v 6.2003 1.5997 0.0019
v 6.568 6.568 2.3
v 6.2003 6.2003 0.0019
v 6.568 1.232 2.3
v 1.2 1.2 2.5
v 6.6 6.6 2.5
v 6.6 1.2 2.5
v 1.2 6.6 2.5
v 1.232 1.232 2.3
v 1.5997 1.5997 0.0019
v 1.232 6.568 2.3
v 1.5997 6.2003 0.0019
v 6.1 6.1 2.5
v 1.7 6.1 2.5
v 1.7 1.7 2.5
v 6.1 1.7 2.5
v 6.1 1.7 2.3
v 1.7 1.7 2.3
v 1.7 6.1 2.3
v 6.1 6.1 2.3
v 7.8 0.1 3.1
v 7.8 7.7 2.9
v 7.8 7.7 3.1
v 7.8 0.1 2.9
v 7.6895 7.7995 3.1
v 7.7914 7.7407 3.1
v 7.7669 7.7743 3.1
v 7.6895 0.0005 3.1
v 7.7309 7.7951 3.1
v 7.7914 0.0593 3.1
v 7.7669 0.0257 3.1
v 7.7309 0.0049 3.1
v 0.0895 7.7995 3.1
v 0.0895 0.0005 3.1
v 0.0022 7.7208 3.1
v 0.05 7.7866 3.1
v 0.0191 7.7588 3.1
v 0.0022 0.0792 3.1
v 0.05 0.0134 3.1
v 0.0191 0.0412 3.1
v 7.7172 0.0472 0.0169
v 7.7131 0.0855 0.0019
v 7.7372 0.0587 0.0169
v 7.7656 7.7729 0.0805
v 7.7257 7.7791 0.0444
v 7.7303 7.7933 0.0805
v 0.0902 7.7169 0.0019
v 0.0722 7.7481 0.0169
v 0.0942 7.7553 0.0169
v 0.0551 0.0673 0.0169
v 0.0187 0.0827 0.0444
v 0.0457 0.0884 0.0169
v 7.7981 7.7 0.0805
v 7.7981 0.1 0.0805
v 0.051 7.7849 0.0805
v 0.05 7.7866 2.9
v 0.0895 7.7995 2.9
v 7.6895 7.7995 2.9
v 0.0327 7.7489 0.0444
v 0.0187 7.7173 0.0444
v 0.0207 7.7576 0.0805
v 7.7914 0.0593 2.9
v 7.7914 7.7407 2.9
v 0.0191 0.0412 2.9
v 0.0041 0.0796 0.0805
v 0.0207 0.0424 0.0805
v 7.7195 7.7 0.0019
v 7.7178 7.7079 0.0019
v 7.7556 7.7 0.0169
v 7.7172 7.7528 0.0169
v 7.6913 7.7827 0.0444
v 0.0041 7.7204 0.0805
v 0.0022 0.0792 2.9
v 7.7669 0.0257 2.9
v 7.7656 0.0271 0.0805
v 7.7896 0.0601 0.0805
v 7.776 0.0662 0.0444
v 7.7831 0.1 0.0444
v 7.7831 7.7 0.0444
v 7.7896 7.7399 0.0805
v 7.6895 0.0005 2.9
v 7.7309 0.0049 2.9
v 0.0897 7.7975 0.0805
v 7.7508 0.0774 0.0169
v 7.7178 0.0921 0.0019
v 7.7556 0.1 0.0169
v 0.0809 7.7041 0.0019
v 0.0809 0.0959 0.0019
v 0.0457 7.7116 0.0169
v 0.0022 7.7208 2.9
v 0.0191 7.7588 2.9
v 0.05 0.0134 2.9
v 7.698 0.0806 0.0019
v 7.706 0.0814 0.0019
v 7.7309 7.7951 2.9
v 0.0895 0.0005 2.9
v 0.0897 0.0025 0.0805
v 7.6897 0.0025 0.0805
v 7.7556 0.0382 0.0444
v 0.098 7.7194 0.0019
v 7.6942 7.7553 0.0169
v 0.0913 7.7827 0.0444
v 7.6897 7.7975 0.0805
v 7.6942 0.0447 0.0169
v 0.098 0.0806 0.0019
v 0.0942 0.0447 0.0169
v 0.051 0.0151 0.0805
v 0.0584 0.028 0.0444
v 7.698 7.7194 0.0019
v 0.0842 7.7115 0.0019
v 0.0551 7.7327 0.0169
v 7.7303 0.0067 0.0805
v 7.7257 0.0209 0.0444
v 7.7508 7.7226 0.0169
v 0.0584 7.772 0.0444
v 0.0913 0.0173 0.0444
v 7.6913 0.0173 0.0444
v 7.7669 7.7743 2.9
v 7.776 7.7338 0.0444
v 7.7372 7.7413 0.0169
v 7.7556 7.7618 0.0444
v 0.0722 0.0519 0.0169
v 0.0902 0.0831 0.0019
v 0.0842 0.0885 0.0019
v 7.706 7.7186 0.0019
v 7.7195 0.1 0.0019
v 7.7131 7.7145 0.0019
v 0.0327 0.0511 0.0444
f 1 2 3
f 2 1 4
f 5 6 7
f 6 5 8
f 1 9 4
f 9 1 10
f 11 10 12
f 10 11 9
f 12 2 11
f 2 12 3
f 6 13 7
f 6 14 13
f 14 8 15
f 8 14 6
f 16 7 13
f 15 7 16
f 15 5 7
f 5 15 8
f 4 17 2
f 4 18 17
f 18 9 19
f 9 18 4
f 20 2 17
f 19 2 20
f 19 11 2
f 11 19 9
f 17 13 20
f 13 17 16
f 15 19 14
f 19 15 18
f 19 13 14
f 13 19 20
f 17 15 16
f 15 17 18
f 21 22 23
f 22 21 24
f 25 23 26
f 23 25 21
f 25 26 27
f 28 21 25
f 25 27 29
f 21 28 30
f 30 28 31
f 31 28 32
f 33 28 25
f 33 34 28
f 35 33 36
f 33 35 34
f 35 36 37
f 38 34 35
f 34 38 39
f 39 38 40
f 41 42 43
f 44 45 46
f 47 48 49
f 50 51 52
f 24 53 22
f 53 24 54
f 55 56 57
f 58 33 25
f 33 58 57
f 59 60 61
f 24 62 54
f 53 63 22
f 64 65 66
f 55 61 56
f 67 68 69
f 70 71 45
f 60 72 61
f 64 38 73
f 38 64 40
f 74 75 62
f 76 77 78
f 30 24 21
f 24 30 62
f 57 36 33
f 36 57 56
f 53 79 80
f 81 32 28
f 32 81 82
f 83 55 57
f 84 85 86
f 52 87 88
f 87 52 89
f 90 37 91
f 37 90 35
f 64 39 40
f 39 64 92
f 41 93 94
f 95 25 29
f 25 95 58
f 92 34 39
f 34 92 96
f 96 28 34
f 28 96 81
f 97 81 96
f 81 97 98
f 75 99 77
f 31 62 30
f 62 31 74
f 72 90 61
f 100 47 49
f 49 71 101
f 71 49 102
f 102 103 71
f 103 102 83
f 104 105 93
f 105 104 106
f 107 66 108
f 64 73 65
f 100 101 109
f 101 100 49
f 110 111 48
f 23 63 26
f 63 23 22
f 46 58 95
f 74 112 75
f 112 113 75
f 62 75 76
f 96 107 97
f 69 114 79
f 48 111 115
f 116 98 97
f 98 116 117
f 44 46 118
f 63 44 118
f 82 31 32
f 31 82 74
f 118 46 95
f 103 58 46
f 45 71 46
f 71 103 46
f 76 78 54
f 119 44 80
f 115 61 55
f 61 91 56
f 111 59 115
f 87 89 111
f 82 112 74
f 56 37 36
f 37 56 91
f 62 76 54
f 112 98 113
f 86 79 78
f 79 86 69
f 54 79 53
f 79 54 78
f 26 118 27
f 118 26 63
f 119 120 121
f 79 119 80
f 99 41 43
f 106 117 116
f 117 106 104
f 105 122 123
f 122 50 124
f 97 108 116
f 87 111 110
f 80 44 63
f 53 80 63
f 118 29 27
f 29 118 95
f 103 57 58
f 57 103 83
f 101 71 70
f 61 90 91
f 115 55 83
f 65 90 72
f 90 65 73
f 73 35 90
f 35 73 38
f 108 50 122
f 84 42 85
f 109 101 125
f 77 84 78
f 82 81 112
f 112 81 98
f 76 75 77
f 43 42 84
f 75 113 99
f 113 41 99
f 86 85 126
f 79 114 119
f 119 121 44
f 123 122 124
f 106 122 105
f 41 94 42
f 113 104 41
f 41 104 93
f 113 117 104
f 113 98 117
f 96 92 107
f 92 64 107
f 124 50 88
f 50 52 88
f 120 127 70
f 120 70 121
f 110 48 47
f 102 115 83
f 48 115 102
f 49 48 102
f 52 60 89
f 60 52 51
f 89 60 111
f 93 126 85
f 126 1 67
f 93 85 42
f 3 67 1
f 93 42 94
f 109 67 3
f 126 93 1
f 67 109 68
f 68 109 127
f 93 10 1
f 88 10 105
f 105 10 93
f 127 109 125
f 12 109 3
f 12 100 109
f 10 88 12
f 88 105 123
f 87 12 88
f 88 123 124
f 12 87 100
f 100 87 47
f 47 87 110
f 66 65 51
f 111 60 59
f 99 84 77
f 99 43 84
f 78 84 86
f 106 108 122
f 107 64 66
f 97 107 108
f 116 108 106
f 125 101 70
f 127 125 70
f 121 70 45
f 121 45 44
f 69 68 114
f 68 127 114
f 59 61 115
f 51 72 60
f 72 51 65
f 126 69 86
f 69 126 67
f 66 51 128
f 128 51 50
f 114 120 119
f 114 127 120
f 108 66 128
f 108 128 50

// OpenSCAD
// file: ../lib/brick-hollow.scad
/**
* Machine Blocks
* https://machinemania.net/blocks 
*
* Brick Hollow
* Copyright (c) 2022 Jan Philipp Knoeller <pk@pksoftware.de>
*
* Published under license:
* Creative Commons Attribution-NonCommercial-ShareAlike 4.0 International 
* https://creativecommons.org/licenses/by-nc-sa/4.0/
*
*/
echo(version=version());

module brickHollow(height=9.3, fade=2.5, minSize=[4.6,4.6], maxSize=[5.2, 5.2], center = false){
    echo(height, minSize, maxSize, fade);
    sizeX = max(minSize[0],maxSize[0]); 
   sizeY = max(minSize[1],maxSize[1]); 
    
    posX = center ? 0 : 0.5*sizeX; 
   posY = center ? 0 : 0.5*sizeY;   
   posZ = center ? -0.5 * (height-fade) : 0.5*fade;
    
    cutHelper = 0.2;
    overlapSpace=0.1;
    
    translate([posX, posY, posZ]){
        union(){
            polyhedron(points=[
                [-0.5*minSize[0],-0.5*minSize[1],-0.5*fade],
                [0.5*minSize[0],-0.5*minSize[1],-0.5*fade],
                [0.5*minSize[0],0.5*minSize[1],-0.5*fade],
                [-0.5*minSize[0],0.5*minSize[1],-0.5*fade],
                [-0.5*maxSize[0],-0.5*maxSize[1],0.5*fade],
                [0.5*maxSize[0],-0.5*maxSize[1],0.5*fade],
                [0.5*maxSize[0],0.5*maxSize[1],0.5*fade],
                [-0.5*maxSize[0],0.5*maxSize[1],0.5*fade]
            ], faces=[[0,1,2,3],[1,0,4,5],[2,1,5,6],[3,2,6,7],[0,3,7,4],[7,6,5,4]]);
            
            if(height > fade){
                translate([0,0,0.5*height - overlapSpace]){
                    cube([maxSize[0], maxSize[1], height - fade + overlapSpace], center=true);
                }
            }
            
            translate([0,0,-0.5*(fade + cutHelper) + overlapSpace]){
                cube([minSize[0], minSize[1], cutHelper + overlapSpace], center=true);
            }
        }
    }
}

//brickHollow(height=9.3, maxSize=[5.2,5.2], minSize=[4.6,4.6], center=true);
// file: ../lib/roundedcube_simple.scad
/**
* Machine Blocks
* https://machinemania.net/blocks 
*
* Module for simple rounded cubes
* Copyright (c) 2022 Jan Philipp Knoeller <pk@pksoftware.de>
*
* Published under license:
* Creative Commons Attribution-NonCommercial-ShareAlike 4.0 International 
* https://creativecommons.org/licenses/by-nc-sa/4.0/
*
*/
module roundedcube_simple(size = [1, 1, 1], center = false, radius = 0.5, resolution = 20) {
	// If single value, convert to [x, y, z] vector
	size = (size[0] == undef) ? [size, size, size] : size;

	translate = (center == false) ?
		[radius, radius, radius] :
		[
			radius - (size[0] / 2),
			radius - (size[1] / 2),
			radius - (size[2] / 2)
	];

	translate(v = translate)
	minkowski() {
		cube(size = [
			size[0] - (radius * 2),
			size[1] - (radius * 2),
			size[2] - (radius * 2)
		]);
		sphere(r = radius, $fn = resolution);
	}
}
// file: ../lib/roundedcube.scad
// More information: https://danielupshaw.com/openscad-rounded-corners/

// Set to 0.01 for higher definition curves (renders slower)
$fs = 0.15;

module roundedcube(size = [1, 1, 1], center = false, radius = 0.5, apply_to = "all", resolution = 20) {
	// If single value, convert to [x, y, z] vector
	size = (size[0] == undef) ? [size, size, size] : size;

	translate_min = radius;
	translate_xmax = size[0] - radius;
	translate_ymax = size[1] - radius;
	translate_zmax = size[2] - radius;

	diameter = radius * 2;

	obj_translate = (center == false) ?
		[0, 0, 0] : [
			-(size[0] / 2),
			-(size[1] / 2),
			-(size[2] / 2)
		];

	translate(v = obj_translate) {
		hull() {
			for (translate_x = [translate_min, translate_xmax]) {
				x_at = (translate_x == translate_min) ? "min" : "max";
				for (translate_y = [translate_min, translate_ymax]) {
					y_at = (translate_y == translate_min) ? "min" : "max";
					for (translate_z = [translate_min, translate_zmax]) {
						z_at = (translate_z == translate_min) ? "min" : "max";

						translate(v = [translate_x, translate_y, translate_z])
						if (
							(apply_to == "all") ||
							(apply_to == "xmin" && x_at == "min") || (apply_to == "xmax" && x_at == "max") ||
							(apply_to == "ymin" && y_at == "min") || (apply_to == "ymax" && y_at == "max") ||
							(apply_to == "zmin" && z_at == "min") || (apply_to == "zmax" && z_at == "max")
						) {
							sphere(r = radius, $fn = resolution);
						} else {
							rotate = 
								(apply_to == "xmin" || apply_to == "xmax" || apply_to == "x") ? [0, 90, 0] : (
								(apply_to == "ymin" || apply_to == "ymax" || apply_to == "y") ? [90, 90, 0] :
								[0, 0, 0]
							);
							rotate(a = rotate)
							cylinder(h = diameter, r = radius, center = true, $fn = resolution);
						}
					}
				}
			}
		}
	}
}
// main file
/**
* Machine Blocks
* https://machinemania.net/blocks 
*
* Plate 1x1 without knobs
* Copyright (c) 2022 Jan Philipp Knoeller <pk@pksoftware.de>
*
* Published under license:
* Creative Commons Attribution-NonCommercial-ShareAlike 4.0 International 
* https://creativecommons.org/licenses/by-nc-sa/4.0/
*
*/
echo(version=version());

include <../lib/block-v2.scad>;

block(grid=[1,1], withKnobs=false);
